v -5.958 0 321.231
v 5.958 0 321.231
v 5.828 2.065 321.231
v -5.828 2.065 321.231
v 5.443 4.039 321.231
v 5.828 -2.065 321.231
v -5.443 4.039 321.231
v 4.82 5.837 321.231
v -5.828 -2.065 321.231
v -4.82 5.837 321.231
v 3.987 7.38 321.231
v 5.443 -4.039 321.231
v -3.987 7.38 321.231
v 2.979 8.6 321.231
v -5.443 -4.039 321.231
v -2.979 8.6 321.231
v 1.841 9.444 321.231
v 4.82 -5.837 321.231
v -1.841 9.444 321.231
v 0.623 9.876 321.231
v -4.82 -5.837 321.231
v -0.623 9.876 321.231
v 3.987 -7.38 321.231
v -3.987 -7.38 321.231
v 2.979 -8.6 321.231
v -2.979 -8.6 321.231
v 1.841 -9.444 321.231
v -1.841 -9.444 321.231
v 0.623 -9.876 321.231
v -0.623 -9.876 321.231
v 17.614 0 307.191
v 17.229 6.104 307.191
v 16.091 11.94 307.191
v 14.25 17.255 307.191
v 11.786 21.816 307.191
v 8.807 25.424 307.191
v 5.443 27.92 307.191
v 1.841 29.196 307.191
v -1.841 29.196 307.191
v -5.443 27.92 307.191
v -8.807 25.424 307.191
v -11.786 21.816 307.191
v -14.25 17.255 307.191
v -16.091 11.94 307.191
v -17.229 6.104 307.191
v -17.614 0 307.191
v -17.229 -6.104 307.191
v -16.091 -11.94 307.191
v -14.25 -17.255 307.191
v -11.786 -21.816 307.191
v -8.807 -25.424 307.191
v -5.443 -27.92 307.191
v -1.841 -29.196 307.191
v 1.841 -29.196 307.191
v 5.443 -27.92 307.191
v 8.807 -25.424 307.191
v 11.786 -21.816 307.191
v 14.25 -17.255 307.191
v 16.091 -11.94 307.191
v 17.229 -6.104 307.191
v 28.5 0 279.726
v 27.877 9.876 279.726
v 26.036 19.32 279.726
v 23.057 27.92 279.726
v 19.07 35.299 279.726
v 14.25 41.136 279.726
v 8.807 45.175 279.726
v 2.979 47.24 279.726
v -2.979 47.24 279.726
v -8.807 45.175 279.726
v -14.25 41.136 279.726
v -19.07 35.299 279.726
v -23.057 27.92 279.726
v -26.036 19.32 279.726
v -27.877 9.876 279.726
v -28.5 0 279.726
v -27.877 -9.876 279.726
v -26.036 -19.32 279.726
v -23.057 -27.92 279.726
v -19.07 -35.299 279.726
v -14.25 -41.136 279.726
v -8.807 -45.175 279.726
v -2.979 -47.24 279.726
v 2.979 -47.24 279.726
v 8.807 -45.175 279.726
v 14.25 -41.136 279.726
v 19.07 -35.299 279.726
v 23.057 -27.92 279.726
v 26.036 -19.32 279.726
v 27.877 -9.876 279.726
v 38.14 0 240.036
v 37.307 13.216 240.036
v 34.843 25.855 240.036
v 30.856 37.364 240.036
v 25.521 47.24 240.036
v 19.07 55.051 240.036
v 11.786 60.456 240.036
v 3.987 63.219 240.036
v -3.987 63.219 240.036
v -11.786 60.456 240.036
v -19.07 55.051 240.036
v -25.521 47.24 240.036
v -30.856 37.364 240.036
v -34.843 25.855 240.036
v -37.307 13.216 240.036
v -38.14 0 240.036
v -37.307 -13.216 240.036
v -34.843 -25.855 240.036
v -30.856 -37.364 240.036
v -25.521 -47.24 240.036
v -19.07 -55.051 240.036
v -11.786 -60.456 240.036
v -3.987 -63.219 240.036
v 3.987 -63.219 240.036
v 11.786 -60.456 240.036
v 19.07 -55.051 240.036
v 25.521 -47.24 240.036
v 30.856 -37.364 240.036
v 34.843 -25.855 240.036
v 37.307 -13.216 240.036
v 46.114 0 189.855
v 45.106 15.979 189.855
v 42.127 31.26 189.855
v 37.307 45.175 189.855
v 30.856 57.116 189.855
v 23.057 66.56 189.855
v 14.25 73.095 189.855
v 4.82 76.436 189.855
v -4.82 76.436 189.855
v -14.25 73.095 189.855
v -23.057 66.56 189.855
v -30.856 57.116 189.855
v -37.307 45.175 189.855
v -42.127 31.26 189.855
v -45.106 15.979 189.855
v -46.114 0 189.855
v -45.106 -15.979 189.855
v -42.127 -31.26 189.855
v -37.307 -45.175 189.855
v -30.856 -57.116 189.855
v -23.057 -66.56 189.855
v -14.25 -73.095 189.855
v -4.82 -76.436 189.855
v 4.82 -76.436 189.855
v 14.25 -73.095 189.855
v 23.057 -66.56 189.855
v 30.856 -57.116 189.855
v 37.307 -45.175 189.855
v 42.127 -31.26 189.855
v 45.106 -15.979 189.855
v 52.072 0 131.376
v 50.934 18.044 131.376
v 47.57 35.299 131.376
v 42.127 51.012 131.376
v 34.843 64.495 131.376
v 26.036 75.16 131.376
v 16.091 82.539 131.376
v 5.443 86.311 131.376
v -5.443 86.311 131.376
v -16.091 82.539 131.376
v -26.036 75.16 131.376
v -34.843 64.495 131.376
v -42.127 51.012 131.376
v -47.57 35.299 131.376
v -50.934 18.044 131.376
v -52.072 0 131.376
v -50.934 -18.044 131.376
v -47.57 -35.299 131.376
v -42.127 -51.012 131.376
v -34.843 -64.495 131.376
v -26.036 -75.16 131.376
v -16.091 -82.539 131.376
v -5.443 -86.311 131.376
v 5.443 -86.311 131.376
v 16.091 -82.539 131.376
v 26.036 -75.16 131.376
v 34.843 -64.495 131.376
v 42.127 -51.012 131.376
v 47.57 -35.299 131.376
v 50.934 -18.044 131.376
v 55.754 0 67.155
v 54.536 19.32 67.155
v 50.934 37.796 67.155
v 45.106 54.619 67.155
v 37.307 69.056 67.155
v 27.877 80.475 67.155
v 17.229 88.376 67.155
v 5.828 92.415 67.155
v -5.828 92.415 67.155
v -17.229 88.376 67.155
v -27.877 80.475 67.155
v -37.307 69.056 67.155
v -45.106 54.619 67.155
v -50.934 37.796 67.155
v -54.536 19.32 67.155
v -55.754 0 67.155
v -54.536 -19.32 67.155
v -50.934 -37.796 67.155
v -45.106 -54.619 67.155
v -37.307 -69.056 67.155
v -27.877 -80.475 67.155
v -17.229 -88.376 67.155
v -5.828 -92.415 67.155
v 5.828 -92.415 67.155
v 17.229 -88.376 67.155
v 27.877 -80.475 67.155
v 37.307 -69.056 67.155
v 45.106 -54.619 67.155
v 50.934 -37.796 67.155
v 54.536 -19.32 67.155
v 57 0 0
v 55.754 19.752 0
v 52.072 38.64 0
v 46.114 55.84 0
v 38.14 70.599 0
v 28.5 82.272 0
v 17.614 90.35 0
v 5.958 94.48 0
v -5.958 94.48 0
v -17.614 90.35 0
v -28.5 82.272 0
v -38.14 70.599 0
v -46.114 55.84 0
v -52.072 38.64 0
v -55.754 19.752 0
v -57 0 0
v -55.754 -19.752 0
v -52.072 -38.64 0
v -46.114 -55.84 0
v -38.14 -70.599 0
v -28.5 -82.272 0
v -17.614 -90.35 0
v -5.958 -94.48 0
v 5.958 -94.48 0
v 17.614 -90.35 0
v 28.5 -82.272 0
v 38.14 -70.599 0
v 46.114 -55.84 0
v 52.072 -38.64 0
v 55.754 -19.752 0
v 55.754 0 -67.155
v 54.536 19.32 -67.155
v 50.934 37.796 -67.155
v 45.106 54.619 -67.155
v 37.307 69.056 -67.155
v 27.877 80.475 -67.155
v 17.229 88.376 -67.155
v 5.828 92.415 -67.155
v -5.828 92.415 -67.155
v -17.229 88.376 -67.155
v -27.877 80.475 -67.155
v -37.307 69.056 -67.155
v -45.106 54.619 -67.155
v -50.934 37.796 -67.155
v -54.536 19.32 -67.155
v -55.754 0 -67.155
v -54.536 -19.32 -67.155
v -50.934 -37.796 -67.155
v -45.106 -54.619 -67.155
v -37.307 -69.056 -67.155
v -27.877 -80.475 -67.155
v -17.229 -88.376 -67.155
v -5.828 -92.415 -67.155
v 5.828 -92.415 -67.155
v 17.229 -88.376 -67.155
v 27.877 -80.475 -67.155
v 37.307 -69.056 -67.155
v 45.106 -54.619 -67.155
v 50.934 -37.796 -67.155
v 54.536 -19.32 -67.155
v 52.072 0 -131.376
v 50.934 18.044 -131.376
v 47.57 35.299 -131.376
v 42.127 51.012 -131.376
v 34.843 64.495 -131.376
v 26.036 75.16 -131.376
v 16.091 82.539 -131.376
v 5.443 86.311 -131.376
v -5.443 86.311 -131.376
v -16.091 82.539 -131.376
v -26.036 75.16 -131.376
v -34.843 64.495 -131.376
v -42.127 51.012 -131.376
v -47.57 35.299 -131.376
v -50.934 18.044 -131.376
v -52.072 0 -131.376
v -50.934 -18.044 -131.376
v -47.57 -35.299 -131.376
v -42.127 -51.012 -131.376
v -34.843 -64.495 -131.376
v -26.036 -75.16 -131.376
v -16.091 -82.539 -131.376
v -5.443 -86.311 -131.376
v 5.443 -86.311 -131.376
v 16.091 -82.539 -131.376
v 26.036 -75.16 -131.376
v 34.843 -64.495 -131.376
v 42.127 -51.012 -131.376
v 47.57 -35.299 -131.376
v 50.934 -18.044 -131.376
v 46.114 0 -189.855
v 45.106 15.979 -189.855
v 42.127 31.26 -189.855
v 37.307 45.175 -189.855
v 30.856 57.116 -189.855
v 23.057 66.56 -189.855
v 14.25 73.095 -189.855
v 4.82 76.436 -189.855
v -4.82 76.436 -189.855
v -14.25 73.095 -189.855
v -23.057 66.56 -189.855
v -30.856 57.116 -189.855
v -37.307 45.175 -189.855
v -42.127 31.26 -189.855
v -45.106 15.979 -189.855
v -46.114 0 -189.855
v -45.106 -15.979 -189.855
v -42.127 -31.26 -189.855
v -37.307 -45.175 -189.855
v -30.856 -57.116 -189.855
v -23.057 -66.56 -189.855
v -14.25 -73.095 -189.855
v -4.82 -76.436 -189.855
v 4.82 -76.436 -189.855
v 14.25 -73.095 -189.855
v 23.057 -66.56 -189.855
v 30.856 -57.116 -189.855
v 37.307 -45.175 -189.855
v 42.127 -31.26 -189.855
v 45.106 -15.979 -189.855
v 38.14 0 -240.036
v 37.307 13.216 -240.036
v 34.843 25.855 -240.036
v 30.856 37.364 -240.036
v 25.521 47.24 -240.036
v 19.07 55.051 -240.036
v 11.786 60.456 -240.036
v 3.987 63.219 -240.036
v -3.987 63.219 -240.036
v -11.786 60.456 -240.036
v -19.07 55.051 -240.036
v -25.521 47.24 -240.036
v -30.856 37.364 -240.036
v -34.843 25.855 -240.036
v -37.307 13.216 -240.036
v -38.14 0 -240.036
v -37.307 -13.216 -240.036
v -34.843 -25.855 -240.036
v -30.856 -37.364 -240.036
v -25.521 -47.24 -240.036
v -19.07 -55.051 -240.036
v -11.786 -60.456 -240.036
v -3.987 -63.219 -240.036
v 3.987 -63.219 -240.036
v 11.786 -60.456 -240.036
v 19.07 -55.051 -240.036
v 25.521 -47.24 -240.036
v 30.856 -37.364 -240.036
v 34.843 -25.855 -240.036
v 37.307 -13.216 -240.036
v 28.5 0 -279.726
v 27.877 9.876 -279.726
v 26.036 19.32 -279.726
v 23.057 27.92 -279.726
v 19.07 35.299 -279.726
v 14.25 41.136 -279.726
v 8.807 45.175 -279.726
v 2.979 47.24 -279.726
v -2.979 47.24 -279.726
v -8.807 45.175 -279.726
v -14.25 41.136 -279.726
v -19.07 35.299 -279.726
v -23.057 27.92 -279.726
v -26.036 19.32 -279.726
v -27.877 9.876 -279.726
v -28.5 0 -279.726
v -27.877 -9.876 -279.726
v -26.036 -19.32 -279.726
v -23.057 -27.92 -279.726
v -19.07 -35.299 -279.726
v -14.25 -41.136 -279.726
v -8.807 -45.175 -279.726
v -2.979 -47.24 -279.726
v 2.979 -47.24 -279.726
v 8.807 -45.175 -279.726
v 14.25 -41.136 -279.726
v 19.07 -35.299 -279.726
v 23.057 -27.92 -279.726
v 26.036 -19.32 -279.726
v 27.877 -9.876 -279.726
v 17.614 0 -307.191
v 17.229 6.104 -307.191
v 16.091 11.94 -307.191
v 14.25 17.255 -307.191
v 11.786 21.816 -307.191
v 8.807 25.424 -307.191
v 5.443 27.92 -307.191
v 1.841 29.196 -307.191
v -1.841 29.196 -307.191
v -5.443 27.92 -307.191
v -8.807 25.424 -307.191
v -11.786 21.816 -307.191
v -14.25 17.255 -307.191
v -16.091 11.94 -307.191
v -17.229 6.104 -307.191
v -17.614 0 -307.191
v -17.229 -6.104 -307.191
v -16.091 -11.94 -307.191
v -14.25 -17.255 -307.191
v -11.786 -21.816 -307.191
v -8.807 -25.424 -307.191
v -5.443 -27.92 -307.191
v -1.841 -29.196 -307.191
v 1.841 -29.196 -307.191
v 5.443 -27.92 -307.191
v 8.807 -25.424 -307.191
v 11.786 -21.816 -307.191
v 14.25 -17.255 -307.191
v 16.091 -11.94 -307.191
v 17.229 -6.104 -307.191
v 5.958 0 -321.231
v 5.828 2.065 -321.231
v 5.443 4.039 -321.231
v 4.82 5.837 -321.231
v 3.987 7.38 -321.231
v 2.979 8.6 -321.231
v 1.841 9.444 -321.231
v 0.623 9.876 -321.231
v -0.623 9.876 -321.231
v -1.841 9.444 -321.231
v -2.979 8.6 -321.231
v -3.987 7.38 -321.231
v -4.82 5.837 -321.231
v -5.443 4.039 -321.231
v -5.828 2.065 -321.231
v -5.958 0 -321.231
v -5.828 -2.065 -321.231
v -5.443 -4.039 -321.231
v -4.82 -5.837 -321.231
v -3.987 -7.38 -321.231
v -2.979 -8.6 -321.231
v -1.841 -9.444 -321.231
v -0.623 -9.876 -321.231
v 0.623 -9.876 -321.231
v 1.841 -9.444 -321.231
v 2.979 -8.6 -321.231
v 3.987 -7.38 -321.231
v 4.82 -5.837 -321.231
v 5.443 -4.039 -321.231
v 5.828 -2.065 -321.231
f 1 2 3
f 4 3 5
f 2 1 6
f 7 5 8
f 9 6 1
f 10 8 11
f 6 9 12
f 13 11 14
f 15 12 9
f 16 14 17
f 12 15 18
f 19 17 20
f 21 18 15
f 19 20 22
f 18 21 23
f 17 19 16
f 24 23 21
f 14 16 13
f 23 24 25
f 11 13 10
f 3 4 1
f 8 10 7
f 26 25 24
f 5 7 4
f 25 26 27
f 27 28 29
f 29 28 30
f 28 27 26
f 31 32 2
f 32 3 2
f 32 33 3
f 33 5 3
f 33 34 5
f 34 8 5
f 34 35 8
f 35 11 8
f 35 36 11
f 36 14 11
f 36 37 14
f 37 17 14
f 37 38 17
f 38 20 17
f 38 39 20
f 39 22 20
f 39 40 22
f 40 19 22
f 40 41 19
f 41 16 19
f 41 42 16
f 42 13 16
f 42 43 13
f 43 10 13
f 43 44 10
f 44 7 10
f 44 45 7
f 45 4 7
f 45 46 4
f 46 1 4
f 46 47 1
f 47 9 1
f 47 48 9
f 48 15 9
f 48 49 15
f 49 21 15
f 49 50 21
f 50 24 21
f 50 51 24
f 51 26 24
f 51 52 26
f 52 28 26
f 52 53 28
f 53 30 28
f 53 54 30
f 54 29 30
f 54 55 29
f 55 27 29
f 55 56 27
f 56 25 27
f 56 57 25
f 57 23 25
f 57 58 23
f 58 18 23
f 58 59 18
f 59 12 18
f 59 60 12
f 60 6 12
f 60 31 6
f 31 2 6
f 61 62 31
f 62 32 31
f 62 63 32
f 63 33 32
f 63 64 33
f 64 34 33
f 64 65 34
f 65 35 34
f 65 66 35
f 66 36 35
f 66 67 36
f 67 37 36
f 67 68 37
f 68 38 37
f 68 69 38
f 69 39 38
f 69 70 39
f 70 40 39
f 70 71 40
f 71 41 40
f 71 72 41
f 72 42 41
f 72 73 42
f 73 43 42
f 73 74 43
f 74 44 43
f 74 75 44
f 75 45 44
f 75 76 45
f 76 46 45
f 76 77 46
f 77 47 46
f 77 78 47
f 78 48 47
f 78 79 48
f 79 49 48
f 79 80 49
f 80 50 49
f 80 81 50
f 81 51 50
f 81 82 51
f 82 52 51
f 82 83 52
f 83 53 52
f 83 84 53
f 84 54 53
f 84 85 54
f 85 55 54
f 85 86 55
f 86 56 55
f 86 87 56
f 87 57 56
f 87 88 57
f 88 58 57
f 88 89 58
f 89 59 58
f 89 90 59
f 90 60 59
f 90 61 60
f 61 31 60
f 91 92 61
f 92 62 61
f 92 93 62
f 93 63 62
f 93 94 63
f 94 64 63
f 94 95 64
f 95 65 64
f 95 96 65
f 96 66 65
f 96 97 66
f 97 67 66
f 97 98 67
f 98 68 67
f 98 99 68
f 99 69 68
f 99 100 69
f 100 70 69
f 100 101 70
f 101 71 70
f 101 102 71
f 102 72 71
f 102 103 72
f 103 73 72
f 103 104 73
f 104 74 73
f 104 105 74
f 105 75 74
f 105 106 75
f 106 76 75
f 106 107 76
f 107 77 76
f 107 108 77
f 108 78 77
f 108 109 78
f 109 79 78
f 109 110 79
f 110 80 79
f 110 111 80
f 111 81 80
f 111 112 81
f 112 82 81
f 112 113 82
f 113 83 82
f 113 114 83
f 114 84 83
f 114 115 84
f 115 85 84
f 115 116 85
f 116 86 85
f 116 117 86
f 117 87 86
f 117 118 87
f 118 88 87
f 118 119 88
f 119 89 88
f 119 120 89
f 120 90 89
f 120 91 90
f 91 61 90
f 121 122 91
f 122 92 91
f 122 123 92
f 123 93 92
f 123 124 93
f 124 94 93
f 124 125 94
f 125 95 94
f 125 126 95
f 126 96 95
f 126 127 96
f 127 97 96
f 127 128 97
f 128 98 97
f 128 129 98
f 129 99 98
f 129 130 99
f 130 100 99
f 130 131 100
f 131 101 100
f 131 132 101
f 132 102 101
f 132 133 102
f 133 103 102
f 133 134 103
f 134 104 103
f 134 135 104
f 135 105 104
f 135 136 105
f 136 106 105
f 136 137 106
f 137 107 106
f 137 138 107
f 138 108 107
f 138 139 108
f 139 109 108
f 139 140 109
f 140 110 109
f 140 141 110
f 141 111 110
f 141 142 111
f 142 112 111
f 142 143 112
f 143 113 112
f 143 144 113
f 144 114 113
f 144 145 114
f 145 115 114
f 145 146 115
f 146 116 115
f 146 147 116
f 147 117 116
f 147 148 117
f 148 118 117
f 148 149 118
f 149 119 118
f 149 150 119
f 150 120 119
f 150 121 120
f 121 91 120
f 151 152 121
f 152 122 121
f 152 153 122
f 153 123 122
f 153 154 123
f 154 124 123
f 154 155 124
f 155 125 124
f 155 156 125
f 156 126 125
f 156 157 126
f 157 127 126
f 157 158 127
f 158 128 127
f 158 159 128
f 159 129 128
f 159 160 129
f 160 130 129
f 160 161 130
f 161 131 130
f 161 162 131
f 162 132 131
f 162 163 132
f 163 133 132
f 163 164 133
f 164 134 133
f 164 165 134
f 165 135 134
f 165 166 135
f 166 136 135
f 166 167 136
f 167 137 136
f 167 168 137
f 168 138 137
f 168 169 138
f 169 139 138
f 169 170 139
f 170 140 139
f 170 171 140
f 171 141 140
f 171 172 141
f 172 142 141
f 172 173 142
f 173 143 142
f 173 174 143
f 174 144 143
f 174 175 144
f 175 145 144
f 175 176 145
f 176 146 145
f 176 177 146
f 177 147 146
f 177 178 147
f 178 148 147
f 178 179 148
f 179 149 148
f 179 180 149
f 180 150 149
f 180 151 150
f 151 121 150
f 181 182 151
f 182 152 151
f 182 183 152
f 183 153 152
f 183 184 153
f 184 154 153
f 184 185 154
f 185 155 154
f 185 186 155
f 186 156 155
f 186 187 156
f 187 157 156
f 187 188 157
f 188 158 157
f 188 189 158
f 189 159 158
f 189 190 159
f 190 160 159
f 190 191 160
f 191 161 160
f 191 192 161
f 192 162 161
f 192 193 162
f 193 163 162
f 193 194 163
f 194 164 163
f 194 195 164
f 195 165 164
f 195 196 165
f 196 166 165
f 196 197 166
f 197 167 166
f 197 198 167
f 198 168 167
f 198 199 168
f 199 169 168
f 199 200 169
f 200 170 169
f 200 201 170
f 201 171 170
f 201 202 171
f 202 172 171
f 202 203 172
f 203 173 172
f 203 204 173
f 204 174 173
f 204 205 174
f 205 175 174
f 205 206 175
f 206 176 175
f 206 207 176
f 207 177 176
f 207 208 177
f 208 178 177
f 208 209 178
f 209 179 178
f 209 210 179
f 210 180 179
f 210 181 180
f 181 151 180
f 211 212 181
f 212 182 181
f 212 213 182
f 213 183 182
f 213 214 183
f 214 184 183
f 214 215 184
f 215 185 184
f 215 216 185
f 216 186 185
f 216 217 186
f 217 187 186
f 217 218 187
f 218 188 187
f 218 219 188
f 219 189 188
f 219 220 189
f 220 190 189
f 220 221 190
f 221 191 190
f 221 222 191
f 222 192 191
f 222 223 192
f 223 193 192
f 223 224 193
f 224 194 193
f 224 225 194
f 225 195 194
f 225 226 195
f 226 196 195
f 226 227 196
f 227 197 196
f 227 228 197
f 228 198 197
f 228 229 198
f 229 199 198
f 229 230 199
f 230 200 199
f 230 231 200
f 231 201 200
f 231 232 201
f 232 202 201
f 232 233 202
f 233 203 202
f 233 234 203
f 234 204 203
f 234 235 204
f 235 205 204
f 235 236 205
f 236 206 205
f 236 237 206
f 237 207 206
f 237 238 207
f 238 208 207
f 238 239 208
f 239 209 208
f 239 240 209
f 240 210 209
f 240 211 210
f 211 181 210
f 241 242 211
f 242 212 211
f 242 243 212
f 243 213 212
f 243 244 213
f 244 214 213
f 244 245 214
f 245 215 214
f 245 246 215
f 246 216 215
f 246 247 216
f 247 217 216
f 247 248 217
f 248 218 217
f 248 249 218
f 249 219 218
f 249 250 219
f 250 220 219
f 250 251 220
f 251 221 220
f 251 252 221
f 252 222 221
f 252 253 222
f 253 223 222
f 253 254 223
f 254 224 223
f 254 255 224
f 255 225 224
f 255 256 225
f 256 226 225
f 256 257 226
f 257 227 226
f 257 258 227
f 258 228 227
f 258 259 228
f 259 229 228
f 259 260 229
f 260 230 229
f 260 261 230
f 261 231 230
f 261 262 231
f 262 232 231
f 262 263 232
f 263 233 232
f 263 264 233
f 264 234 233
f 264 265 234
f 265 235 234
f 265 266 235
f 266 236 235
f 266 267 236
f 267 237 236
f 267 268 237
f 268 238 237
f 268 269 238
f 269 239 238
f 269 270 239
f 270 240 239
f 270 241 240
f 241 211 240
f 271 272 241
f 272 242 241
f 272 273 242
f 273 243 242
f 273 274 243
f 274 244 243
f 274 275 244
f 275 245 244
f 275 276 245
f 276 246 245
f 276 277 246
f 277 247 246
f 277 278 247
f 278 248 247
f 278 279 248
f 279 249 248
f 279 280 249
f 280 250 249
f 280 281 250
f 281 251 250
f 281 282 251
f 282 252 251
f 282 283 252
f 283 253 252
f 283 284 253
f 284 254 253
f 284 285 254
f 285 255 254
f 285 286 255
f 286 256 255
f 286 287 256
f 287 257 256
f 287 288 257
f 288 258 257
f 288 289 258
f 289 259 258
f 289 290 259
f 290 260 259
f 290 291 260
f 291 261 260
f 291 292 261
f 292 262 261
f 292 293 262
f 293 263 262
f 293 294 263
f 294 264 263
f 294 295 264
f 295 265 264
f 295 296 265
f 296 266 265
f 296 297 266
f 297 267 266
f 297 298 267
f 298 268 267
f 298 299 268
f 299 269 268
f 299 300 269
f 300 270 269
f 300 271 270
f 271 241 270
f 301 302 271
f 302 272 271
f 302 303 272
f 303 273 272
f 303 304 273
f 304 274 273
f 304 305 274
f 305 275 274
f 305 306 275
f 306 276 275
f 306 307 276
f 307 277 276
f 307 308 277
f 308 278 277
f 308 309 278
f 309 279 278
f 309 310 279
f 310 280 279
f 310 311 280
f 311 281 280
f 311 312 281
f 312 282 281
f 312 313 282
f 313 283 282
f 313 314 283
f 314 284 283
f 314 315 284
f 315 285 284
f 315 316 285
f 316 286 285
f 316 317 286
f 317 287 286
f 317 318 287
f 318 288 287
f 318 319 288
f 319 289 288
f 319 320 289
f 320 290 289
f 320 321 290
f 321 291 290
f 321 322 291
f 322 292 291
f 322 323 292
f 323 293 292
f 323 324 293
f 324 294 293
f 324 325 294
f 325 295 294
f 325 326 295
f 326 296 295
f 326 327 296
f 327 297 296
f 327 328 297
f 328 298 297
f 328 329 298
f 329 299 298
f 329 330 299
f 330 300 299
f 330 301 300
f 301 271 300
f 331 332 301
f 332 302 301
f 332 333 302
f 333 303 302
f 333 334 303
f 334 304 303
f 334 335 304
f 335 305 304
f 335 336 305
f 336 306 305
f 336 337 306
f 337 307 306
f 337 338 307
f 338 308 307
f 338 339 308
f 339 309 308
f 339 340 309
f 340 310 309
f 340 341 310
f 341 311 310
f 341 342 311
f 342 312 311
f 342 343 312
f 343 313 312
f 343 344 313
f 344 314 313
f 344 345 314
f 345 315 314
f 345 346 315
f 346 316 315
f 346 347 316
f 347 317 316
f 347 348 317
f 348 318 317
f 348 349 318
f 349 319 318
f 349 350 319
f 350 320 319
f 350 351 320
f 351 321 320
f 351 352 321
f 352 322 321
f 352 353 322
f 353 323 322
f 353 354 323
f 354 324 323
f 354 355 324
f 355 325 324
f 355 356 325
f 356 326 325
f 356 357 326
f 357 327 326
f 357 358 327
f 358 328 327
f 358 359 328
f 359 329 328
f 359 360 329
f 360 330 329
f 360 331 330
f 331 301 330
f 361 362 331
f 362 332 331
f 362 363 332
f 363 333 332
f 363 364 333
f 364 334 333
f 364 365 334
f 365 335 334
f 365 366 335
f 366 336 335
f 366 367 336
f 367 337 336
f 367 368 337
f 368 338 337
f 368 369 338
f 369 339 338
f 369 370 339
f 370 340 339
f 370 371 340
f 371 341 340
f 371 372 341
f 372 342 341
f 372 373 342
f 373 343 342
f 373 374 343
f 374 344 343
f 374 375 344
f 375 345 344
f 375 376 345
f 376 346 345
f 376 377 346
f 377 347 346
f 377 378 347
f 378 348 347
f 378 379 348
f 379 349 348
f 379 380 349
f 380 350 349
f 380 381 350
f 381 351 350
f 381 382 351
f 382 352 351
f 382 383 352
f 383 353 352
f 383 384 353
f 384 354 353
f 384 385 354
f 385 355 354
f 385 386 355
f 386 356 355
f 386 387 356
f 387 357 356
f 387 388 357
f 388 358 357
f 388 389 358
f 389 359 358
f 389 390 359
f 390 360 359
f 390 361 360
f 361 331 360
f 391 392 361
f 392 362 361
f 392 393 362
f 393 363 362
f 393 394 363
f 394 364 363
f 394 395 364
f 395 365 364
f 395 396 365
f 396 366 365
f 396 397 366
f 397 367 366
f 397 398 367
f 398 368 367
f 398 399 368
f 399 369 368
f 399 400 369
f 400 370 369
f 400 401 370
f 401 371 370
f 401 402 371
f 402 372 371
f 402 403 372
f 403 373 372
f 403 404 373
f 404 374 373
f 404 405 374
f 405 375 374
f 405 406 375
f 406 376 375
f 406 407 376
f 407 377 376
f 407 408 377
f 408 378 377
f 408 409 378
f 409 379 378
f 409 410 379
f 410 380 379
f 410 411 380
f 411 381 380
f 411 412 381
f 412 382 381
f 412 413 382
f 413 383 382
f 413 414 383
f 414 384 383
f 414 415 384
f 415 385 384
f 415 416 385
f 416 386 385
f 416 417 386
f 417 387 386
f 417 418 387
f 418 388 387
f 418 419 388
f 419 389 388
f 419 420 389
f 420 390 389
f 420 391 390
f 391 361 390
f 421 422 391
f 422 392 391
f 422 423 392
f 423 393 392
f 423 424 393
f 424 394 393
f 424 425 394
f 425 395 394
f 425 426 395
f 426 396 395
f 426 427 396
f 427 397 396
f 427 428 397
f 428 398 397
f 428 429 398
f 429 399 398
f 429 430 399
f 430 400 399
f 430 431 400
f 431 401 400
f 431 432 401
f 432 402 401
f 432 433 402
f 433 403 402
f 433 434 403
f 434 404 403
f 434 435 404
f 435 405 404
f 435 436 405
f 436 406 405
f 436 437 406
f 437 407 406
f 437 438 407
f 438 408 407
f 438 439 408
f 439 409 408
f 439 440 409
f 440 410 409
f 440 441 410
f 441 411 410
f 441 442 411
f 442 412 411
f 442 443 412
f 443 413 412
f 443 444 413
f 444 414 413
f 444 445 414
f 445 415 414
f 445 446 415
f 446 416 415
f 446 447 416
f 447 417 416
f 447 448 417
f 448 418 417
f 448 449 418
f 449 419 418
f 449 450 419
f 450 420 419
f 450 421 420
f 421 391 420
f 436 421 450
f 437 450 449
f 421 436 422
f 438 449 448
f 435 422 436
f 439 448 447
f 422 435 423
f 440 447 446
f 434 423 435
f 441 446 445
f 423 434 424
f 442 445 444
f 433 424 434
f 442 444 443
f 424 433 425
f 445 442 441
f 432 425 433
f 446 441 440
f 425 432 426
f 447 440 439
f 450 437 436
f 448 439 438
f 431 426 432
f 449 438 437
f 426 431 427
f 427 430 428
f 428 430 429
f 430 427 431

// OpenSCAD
// Generated by SolidPython 1.0.1 on 2020-07-29 00:46:45


scale(v = [3, 5, 17]) {
	sphere(r = 19);
}
/***********************************************
*********      SolidPython code:      **********
************************************************
 
# import packages: SolidPython
from solid import *
from solid.utils import *
from itertools import chain, combinations, permutations


class Resize:

    def __init__(self, scad_file):
        self.scad_file = scad_file
        #self.scad_file = import_scad(scad_file)
        # cone/cylinder param:
        self.r1 = 0
        self.r2 = 0
        self.h = 0
        # rectangular prism param:
        self.w = 0
        self.l = 0
        # ellipse param:
        self.r = 0

    # import OpenScad code (file name corresponds to shape)


    # classify shape + parameters
    def assign(self, param1, param2, param3):
        if self.scad_file == 'cone.scad':
            self.r1 = param1
            self.r2 = param2
            self.h = param3
        elif self.scad_file == 'cylinder.scad':
            self.r1 = param1
            self.r2 = param2
            self.h = param3
        elif self.scad_file == 'rectangularPrism.scad':
            self.h = param1
            self.l = param2
            self.w = param3
        else:
            self.r = param1
            self.h = param2

    # resize parameters
    def iterate(self):
        x = range(3, 20, 2)
        i = 1
        if self.scad_file == 'cone.scad':
            tempList = list(permutations(x, 2))
            for temp in tempList:
                param1 = temp[0]
                param2 = temp[1]
                filepath = 'produced_scad_files/' + 'cone' + str(param1) + '_' + str(param2) + '_' + '.scad'
                scad_render_to_file(cylinder(h=param1, r1=param2, r2=0), filepath)

        elif self.scad_file == 'cylinder.scad':
            tempList = list(permutations(x, 3))
            for temp in tempList:
                param1 = temp[0]
                param2 = temp[1]
                filepath = 'produced_scad_files/' + 'cylinder' + str(param1) + '_' + str(param2) + '_' + '.scad'
                scad_render_to_file(cylinder(h=param1, r1=param2, r2=param2), filepath)

        elif self.scad_file == 'rectangularPrism.scad':
            tempList = list(permutations(x, 3))
            for temp in tempList:
                param1 = temp[0]
                param2 = temp[1]
                param3 = temp[2]
                filepath = 'produced_scad_files/' + 'rectangularPrism' + str(param1) + '_' + str(param2) + '_' + str(
                    param3) + '.scad'
                scad_render_to_file(cube(size=(param1, param2, param3)), filepath)

        elif self.scad_file == 'ellipse.scad':
            tempList = list(permutations(x, 4))
            for temp in tempList:
                param1 = temp[0]
                param2 = temp[1]
                param3 = temp[2]
                param4 = temp[3]
                filepath = 'produced_scad_files/' + 'ellipse' + str(param1) + '_' + str(param2) + '_' + str(param3) + '_' + str(param4) + '.scad'
                scad_render_to_file(scale([param1, param2, param3])(sphere(r=param4)), filepath)

    def render_to_scadfile(self):
        scad_render_to_file(scad, 'example.scad') 
 
************************************************/
